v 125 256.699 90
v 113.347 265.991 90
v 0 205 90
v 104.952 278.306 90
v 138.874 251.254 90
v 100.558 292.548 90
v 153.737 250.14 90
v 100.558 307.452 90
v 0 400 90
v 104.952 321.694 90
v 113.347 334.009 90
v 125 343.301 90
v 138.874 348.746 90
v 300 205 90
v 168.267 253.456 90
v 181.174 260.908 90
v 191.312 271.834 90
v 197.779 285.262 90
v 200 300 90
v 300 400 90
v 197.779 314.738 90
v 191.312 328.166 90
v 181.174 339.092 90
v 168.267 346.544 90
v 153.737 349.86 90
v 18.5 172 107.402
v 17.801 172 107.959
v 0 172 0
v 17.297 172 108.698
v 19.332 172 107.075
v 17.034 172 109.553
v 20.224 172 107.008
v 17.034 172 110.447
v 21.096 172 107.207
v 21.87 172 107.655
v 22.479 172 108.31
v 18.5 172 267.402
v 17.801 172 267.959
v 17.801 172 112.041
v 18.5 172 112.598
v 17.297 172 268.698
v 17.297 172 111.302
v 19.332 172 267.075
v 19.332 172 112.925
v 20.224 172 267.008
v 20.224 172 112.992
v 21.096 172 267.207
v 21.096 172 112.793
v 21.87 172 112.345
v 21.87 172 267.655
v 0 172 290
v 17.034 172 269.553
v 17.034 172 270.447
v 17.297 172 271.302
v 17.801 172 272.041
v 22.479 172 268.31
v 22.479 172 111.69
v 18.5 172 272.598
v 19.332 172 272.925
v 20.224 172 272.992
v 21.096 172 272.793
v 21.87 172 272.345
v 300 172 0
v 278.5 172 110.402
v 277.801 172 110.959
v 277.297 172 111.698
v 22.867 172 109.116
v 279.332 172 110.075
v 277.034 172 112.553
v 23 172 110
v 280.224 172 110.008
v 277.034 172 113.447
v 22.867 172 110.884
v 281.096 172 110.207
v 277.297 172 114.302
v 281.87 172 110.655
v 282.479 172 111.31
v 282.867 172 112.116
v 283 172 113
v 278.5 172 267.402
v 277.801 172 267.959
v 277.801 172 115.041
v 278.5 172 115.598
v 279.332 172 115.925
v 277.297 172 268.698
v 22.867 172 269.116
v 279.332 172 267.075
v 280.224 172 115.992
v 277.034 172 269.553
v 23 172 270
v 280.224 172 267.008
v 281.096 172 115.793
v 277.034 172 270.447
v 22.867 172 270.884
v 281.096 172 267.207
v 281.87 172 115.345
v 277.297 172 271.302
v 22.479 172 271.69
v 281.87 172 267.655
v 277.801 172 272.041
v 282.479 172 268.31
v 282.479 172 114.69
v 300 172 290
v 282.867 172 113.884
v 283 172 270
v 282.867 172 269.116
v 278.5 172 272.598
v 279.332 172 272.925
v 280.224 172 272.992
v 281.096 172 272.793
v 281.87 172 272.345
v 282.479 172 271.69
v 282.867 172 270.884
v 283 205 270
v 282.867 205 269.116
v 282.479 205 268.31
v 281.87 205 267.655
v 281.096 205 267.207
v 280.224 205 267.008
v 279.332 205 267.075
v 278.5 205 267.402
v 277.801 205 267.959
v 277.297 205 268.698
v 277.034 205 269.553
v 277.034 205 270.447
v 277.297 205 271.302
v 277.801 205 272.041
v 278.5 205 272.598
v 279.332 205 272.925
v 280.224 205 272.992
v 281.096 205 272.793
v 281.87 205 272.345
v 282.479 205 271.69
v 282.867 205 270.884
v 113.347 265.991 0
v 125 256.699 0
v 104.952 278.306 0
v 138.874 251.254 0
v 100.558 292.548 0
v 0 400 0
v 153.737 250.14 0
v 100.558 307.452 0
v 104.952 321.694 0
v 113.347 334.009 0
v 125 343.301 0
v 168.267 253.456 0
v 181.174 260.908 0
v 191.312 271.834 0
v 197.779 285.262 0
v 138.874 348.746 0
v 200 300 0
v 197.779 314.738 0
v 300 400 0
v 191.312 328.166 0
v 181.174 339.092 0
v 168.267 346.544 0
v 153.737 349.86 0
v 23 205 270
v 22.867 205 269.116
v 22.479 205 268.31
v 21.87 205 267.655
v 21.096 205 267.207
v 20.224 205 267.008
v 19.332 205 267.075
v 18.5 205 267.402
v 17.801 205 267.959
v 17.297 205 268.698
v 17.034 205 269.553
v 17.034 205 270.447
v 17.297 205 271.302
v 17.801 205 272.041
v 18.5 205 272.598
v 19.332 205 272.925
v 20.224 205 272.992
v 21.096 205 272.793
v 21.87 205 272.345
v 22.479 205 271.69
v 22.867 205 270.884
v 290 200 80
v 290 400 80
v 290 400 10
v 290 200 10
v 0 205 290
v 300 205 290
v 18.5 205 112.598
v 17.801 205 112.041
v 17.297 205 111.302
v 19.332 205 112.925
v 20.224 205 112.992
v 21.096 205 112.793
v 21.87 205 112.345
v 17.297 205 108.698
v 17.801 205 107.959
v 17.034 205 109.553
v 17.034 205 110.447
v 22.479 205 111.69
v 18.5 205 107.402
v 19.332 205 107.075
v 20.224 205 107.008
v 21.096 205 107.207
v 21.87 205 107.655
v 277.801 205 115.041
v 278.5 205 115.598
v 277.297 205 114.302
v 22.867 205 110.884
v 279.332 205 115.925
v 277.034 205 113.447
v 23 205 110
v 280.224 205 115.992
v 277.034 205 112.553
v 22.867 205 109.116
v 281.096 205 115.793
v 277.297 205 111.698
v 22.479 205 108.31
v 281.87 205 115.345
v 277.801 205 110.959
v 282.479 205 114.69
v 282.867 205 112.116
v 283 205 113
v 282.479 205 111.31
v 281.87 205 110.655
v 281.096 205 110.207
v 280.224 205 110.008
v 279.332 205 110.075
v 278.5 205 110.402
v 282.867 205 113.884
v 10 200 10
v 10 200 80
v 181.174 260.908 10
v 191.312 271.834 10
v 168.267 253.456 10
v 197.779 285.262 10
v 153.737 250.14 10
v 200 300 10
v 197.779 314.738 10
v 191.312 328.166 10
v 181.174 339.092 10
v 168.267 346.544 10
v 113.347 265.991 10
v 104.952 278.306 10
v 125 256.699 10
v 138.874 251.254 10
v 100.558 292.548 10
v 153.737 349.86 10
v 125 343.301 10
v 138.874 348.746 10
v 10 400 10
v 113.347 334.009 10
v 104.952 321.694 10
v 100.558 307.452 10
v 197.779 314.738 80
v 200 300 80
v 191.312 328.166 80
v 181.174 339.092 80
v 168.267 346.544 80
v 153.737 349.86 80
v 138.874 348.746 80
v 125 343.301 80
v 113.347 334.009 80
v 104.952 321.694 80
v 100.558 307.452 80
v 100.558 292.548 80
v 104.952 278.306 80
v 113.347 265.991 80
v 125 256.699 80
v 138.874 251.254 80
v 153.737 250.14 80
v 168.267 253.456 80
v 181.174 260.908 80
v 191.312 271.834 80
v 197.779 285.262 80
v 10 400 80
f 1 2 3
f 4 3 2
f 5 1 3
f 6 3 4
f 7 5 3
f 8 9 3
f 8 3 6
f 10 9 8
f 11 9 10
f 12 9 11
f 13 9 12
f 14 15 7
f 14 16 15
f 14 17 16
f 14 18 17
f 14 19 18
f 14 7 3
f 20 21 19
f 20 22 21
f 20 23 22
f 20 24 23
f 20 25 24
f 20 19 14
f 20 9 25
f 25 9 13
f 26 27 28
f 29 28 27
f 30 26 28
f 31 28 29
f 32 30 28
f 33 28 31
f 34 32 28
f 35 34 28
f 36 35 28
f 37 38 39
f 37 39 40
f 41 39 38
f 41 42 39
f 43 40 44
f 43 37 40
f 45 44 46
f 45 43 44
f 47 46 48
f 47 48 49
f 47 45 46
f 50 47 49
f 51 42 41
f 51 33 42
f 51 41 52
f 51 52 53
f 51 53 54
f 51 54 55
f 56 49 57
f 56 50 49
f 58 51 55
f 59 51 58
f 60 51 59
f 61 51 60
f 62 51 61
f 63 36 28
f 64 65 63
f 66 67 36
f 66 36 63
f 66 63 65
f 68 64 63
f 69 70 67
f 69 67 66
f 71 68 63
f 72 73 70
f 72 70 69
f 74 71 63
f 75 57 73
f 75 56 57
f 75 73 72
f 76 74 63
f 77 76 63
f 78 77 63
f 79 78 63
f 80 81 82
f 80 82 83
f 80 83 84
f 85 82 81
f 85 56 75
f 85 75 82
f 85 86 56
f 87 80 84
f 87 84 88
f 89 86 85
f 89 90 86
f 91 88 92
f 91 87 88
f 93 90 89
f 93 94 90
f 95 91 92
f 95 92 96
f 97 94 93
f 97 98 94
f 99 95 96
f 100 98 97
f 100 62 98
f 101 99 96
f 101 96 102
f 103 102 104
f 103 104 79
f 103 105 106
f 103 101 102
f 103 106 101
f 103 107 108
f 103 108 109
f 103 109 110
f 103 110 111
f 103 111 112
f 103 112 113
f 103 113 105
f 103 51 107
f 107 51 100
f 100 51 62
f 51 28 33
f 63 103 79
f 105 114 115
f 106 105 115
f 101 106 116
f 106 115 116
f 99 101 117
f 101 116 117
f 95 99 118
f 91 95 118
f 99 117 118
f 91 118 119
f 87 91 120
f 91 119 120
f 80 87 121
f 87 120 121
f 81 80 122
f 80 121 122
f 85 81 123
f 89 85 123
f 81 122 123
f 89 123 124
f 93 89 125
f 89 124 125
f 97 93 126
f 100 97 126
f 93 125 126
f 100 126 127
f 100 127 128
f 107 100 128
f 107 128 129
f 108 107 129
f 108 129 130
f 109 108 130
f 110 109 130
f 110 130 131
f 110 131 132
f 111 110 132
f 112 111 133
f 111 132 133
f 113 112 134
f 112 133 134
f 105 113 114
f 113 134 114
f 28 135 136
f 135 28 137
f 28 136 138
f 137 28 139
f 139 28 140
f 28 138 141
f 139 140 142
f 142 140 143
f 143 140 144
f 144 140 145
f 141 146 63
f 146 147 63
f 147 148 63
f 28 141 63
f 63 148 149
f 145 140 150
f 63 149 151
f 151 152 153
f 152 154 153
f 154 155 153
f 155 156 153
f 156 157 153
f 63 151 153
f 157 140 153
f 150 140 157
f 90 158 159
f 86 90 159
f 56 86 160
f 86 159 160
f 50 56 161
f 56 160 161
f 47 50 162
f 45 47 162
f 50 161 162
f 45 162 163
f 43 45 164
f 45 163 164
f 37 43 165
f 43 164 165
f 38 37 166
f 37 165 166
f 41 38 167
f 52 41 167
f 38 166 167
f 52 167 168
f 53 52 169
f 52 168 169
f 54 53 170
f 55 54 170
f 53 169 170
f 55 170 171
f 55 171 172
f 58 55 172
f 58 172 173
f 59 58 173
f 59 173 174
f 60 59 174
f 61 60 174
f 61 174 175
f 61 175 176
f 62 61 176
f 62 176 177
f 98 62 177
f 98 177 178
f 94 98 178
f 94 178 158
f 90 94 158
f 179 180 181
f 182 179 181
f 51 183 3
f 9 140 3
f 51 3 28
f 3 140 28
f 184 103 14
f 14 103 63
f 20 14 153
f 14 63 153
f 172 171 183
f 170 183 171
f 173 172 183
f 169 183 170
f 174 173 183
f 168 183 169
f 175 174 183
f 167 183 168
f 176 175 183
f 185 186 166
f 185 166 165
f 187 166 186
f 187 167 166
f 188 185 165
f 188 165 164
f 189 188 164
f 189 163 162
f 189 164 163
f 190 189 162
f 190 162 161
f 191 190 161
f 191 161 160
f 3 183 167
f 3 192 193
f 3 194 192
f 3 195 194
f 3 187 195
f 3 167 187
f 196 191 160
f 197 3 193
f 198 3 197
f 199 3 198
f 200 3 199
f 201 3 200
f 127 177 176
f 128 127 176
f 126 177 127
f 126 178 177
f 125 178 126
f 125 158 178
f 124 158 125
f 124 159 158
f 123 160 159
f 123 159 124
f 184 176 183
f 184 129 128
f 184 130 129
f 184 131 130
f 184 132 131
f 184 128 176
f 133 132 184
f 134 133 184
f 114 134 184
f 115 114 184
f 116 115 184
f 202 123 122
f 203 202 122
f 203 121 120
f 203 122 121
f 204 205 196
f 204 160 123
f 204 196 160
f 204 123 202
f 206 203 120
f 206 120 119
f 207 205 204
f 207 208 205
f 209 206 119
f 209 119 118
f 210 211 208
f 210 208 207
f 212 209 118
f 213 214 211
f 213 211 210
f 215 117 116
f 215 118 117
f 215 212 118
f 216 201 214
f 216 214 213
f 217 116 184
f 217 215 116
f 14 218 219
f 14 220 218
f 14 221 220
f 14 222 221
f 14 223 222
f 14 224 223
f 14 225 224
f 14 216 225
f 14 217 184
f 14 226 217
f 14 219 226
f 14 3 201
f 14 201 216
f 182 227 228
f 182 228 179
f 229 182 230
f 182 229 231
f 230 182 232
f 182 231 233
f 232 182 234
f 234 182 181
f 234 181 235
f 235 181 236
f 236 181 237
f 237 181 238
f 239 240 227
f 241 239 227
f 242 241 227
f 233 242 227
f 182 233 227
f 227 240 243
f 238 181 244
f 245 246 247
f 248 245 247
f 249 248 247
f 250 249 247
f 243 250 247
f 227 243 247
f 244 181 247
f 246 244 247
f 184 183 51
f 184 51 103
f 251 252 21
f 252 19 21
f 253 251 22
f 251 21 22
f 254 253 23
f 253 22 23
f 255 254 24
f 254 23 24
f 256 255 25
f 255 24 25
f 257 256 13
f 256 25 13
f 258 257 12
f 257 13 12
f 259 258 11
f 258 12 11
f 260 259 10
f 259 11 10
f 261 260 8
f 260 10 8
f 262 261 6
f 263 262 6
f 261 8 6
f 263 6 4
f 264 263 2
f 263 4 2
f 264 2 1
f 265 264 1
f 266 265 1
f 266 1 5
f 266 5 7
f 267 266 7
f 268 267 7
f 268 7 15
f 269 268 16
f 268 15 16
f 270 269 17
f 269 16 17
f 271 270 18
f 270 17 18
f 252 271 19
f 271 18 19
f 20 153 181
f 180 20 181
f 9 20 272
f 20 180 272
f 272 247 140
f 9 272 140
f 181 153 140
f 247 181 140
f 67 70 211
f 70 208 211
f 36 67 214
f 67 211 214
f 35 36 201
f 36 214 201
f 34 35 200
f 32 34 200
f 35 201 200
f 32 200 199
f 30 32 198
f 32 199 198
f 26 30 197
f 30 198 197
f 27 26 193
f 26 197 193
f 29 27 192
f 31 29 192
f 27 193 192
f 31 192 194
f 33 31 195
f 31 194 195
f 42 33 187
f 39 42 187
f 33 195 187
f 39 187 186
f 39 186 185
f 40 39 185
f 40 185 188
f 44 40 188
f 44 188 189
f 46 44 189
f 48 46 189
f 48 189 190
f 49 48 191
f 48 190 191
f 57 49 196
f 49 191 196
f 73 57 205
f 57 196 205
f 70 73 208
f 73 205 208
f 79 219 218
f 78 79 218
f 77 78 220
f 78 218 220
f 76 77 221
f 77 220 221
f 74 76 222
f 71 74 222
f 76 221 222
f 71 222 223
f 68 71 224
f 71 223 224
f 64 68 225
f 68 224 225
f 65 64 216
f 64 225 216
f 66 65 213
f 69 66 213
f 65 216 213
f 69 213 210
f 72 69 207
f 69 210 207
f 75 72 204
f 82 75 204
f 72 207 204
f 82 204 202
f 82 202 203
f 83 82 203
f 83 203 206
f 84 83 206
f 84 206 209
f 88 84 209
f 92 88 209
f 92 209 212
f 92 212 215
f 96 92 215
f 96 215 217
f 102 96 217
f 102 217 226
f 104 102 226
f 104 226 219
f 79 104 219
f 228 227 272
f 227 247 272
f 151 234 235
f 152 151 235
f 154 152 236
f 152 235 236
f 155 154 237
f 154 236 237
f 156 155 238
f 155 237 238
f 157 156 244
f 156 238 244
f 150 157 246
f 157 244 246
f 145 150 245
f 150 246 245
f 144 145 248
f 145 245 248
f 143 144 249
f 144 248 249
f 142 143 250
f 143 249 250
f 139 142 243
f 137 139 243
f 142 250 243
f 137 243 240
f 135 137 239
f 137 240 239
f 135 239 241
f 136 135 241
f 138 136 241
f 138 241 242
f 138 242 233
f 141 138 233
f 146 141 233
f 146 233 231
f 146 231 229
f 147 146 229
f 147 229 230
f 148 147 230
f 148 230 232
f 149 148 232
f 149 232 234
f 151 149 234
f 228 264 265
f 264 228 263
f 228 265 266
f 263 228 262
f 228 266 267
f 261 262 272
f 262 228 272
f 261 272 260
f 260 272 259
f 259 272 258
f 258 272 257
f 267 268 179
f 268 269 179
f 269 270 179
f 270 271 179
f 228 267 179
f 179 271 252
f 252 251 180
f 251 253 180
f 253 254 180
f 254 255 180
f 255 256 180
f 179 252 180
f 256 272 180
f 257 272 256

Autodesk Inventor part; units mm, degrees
ref_plane "YZ Plane" through (0, 0, 0) normal (1, 0, 0) x (0, 1, 0)
ref_plane "XZ Plane" through (0, 0, 0) normal (0, 1, 0) x (-1, 0, 0)
ref_plane "XY Plane" through (0, 0, 0) normal (0, 0, 1) x (1, 0, 0)
sketch "Sketch1" plane through (0, 0, 0) normal (0, 0, 1) x (1, 0, 0)
  line L0 (0, 0) -> (300, 0)
  line L1 (300, 0) -> (300, 400)
  line L2 (300, 400) -> (0, 400)
  line L3 (0, 400) -> (0, 0)
  dimension "d0" = 300
  dimension "d1" = 400
extrude "Extrusion1" add sketch "Sketch1" along normal blind 90
sketch "Sketch2" plane through (0, 0, 90) normal (0, 0, 1) x (1, 0, 0)
  circle A0 centre (150, 300) radius 50
  point P0 (0, 0)
  dimension "d4" = 100
  dimension "d5" = 150
  dimension "d6" = 300
extrude "Extrusion2" cut sketch "Sketch2" against normal blind 100
sketch "Sketch4" plane through (0, 400, 0) normal (0, 1, 0) x (1, 0, 0)
  line L0 (10, -80) -> (290, -80)
  line L1 (290, -80) -> (290, -10)
  line L2 (290, -10) -> (10, -10)
  line L3 (10, -10) -> (10, -80)
  line L4 (0, 0) -> (0, -90) projected
  dimension "d12" = 70
  dimension "d13" = 280
  dimension "d14" = 10
  dimension "d15" = 10
extrude "Extrusion4" cut sketch "Sketch4" against normal blind 200
sketch "Sketch5" plane through (0, 0, 90) normal (0, 0, 1) x (1, 0, 0)
  line L0 (0, 205) -> (300, 205)
  line L1 (300, 400) -> (0, 400) projected
  line L2 (0, 400) -> (0, 0) projected
  line L3 (300, 0) -> (300, 400) projected
  line L4 (0, 205) -> (0, 172)
  line L5 (0, 172) -> (300, 172)
  line L6 (300, 0) -> (300, 400) projected
  line L7 (300, 205) -> (300, 172)
  dimension "d18" = 195
  dimension "d19" = 33
extrude "Extrusion5" add sketch "Sketch5" along normal blind 200 contours L0 L3 L5 L2
sketch "Sketch6" plane through (0, 0, 0) normal (0, -1, 0) x (1, 0, 0)
  line L0 (300, 90) -> (0, 90) projected
  line L1 (0, 0) -> (300, 0)
  line L2 (300, 0) -> (300, 90)
  line L3 (300, 90) -> (0, 90)
  line L4 (0, 90) -> (0, 0)
extrude "Extrusion6" cut sketch "Sketch6" against normal blind 172
sketch "Sketch7" plane through (0, 205, 90) normal (0, 1, 0) x (1, 0, 0)
  circle A0 centre (20, -180) radius 3
  circle A1 centre (20, -20) radius 3
  circle A2 centre (280, -23) radius 3
  circle A3 centre (280, -180) radius 3
  line L0 (300, -200) -> (0, -200) projected
  line L1 (0, 0) -> (0, -200) projected
  line L2 (300, 0) -> (0, 0) projected
  line L3 (300, 0) -> (300, -200) projected
  point P0 (0, 90)
  dimension "d24" = 20
  dimension "d25" = 20
  dimension "d26" = 6
  dimension "d27" = 20
  dimension "d28" = 20
  dimension "d29" = 20
  dimension "d30" = 20
  dimension "d31" = 20
  dimension "d32" = 20
extrude "Extrusion7" cut sketch "Sketch7" against normal blind 50 contours A0 | A1 | A2 | A3
properties part number "Baseservo"
